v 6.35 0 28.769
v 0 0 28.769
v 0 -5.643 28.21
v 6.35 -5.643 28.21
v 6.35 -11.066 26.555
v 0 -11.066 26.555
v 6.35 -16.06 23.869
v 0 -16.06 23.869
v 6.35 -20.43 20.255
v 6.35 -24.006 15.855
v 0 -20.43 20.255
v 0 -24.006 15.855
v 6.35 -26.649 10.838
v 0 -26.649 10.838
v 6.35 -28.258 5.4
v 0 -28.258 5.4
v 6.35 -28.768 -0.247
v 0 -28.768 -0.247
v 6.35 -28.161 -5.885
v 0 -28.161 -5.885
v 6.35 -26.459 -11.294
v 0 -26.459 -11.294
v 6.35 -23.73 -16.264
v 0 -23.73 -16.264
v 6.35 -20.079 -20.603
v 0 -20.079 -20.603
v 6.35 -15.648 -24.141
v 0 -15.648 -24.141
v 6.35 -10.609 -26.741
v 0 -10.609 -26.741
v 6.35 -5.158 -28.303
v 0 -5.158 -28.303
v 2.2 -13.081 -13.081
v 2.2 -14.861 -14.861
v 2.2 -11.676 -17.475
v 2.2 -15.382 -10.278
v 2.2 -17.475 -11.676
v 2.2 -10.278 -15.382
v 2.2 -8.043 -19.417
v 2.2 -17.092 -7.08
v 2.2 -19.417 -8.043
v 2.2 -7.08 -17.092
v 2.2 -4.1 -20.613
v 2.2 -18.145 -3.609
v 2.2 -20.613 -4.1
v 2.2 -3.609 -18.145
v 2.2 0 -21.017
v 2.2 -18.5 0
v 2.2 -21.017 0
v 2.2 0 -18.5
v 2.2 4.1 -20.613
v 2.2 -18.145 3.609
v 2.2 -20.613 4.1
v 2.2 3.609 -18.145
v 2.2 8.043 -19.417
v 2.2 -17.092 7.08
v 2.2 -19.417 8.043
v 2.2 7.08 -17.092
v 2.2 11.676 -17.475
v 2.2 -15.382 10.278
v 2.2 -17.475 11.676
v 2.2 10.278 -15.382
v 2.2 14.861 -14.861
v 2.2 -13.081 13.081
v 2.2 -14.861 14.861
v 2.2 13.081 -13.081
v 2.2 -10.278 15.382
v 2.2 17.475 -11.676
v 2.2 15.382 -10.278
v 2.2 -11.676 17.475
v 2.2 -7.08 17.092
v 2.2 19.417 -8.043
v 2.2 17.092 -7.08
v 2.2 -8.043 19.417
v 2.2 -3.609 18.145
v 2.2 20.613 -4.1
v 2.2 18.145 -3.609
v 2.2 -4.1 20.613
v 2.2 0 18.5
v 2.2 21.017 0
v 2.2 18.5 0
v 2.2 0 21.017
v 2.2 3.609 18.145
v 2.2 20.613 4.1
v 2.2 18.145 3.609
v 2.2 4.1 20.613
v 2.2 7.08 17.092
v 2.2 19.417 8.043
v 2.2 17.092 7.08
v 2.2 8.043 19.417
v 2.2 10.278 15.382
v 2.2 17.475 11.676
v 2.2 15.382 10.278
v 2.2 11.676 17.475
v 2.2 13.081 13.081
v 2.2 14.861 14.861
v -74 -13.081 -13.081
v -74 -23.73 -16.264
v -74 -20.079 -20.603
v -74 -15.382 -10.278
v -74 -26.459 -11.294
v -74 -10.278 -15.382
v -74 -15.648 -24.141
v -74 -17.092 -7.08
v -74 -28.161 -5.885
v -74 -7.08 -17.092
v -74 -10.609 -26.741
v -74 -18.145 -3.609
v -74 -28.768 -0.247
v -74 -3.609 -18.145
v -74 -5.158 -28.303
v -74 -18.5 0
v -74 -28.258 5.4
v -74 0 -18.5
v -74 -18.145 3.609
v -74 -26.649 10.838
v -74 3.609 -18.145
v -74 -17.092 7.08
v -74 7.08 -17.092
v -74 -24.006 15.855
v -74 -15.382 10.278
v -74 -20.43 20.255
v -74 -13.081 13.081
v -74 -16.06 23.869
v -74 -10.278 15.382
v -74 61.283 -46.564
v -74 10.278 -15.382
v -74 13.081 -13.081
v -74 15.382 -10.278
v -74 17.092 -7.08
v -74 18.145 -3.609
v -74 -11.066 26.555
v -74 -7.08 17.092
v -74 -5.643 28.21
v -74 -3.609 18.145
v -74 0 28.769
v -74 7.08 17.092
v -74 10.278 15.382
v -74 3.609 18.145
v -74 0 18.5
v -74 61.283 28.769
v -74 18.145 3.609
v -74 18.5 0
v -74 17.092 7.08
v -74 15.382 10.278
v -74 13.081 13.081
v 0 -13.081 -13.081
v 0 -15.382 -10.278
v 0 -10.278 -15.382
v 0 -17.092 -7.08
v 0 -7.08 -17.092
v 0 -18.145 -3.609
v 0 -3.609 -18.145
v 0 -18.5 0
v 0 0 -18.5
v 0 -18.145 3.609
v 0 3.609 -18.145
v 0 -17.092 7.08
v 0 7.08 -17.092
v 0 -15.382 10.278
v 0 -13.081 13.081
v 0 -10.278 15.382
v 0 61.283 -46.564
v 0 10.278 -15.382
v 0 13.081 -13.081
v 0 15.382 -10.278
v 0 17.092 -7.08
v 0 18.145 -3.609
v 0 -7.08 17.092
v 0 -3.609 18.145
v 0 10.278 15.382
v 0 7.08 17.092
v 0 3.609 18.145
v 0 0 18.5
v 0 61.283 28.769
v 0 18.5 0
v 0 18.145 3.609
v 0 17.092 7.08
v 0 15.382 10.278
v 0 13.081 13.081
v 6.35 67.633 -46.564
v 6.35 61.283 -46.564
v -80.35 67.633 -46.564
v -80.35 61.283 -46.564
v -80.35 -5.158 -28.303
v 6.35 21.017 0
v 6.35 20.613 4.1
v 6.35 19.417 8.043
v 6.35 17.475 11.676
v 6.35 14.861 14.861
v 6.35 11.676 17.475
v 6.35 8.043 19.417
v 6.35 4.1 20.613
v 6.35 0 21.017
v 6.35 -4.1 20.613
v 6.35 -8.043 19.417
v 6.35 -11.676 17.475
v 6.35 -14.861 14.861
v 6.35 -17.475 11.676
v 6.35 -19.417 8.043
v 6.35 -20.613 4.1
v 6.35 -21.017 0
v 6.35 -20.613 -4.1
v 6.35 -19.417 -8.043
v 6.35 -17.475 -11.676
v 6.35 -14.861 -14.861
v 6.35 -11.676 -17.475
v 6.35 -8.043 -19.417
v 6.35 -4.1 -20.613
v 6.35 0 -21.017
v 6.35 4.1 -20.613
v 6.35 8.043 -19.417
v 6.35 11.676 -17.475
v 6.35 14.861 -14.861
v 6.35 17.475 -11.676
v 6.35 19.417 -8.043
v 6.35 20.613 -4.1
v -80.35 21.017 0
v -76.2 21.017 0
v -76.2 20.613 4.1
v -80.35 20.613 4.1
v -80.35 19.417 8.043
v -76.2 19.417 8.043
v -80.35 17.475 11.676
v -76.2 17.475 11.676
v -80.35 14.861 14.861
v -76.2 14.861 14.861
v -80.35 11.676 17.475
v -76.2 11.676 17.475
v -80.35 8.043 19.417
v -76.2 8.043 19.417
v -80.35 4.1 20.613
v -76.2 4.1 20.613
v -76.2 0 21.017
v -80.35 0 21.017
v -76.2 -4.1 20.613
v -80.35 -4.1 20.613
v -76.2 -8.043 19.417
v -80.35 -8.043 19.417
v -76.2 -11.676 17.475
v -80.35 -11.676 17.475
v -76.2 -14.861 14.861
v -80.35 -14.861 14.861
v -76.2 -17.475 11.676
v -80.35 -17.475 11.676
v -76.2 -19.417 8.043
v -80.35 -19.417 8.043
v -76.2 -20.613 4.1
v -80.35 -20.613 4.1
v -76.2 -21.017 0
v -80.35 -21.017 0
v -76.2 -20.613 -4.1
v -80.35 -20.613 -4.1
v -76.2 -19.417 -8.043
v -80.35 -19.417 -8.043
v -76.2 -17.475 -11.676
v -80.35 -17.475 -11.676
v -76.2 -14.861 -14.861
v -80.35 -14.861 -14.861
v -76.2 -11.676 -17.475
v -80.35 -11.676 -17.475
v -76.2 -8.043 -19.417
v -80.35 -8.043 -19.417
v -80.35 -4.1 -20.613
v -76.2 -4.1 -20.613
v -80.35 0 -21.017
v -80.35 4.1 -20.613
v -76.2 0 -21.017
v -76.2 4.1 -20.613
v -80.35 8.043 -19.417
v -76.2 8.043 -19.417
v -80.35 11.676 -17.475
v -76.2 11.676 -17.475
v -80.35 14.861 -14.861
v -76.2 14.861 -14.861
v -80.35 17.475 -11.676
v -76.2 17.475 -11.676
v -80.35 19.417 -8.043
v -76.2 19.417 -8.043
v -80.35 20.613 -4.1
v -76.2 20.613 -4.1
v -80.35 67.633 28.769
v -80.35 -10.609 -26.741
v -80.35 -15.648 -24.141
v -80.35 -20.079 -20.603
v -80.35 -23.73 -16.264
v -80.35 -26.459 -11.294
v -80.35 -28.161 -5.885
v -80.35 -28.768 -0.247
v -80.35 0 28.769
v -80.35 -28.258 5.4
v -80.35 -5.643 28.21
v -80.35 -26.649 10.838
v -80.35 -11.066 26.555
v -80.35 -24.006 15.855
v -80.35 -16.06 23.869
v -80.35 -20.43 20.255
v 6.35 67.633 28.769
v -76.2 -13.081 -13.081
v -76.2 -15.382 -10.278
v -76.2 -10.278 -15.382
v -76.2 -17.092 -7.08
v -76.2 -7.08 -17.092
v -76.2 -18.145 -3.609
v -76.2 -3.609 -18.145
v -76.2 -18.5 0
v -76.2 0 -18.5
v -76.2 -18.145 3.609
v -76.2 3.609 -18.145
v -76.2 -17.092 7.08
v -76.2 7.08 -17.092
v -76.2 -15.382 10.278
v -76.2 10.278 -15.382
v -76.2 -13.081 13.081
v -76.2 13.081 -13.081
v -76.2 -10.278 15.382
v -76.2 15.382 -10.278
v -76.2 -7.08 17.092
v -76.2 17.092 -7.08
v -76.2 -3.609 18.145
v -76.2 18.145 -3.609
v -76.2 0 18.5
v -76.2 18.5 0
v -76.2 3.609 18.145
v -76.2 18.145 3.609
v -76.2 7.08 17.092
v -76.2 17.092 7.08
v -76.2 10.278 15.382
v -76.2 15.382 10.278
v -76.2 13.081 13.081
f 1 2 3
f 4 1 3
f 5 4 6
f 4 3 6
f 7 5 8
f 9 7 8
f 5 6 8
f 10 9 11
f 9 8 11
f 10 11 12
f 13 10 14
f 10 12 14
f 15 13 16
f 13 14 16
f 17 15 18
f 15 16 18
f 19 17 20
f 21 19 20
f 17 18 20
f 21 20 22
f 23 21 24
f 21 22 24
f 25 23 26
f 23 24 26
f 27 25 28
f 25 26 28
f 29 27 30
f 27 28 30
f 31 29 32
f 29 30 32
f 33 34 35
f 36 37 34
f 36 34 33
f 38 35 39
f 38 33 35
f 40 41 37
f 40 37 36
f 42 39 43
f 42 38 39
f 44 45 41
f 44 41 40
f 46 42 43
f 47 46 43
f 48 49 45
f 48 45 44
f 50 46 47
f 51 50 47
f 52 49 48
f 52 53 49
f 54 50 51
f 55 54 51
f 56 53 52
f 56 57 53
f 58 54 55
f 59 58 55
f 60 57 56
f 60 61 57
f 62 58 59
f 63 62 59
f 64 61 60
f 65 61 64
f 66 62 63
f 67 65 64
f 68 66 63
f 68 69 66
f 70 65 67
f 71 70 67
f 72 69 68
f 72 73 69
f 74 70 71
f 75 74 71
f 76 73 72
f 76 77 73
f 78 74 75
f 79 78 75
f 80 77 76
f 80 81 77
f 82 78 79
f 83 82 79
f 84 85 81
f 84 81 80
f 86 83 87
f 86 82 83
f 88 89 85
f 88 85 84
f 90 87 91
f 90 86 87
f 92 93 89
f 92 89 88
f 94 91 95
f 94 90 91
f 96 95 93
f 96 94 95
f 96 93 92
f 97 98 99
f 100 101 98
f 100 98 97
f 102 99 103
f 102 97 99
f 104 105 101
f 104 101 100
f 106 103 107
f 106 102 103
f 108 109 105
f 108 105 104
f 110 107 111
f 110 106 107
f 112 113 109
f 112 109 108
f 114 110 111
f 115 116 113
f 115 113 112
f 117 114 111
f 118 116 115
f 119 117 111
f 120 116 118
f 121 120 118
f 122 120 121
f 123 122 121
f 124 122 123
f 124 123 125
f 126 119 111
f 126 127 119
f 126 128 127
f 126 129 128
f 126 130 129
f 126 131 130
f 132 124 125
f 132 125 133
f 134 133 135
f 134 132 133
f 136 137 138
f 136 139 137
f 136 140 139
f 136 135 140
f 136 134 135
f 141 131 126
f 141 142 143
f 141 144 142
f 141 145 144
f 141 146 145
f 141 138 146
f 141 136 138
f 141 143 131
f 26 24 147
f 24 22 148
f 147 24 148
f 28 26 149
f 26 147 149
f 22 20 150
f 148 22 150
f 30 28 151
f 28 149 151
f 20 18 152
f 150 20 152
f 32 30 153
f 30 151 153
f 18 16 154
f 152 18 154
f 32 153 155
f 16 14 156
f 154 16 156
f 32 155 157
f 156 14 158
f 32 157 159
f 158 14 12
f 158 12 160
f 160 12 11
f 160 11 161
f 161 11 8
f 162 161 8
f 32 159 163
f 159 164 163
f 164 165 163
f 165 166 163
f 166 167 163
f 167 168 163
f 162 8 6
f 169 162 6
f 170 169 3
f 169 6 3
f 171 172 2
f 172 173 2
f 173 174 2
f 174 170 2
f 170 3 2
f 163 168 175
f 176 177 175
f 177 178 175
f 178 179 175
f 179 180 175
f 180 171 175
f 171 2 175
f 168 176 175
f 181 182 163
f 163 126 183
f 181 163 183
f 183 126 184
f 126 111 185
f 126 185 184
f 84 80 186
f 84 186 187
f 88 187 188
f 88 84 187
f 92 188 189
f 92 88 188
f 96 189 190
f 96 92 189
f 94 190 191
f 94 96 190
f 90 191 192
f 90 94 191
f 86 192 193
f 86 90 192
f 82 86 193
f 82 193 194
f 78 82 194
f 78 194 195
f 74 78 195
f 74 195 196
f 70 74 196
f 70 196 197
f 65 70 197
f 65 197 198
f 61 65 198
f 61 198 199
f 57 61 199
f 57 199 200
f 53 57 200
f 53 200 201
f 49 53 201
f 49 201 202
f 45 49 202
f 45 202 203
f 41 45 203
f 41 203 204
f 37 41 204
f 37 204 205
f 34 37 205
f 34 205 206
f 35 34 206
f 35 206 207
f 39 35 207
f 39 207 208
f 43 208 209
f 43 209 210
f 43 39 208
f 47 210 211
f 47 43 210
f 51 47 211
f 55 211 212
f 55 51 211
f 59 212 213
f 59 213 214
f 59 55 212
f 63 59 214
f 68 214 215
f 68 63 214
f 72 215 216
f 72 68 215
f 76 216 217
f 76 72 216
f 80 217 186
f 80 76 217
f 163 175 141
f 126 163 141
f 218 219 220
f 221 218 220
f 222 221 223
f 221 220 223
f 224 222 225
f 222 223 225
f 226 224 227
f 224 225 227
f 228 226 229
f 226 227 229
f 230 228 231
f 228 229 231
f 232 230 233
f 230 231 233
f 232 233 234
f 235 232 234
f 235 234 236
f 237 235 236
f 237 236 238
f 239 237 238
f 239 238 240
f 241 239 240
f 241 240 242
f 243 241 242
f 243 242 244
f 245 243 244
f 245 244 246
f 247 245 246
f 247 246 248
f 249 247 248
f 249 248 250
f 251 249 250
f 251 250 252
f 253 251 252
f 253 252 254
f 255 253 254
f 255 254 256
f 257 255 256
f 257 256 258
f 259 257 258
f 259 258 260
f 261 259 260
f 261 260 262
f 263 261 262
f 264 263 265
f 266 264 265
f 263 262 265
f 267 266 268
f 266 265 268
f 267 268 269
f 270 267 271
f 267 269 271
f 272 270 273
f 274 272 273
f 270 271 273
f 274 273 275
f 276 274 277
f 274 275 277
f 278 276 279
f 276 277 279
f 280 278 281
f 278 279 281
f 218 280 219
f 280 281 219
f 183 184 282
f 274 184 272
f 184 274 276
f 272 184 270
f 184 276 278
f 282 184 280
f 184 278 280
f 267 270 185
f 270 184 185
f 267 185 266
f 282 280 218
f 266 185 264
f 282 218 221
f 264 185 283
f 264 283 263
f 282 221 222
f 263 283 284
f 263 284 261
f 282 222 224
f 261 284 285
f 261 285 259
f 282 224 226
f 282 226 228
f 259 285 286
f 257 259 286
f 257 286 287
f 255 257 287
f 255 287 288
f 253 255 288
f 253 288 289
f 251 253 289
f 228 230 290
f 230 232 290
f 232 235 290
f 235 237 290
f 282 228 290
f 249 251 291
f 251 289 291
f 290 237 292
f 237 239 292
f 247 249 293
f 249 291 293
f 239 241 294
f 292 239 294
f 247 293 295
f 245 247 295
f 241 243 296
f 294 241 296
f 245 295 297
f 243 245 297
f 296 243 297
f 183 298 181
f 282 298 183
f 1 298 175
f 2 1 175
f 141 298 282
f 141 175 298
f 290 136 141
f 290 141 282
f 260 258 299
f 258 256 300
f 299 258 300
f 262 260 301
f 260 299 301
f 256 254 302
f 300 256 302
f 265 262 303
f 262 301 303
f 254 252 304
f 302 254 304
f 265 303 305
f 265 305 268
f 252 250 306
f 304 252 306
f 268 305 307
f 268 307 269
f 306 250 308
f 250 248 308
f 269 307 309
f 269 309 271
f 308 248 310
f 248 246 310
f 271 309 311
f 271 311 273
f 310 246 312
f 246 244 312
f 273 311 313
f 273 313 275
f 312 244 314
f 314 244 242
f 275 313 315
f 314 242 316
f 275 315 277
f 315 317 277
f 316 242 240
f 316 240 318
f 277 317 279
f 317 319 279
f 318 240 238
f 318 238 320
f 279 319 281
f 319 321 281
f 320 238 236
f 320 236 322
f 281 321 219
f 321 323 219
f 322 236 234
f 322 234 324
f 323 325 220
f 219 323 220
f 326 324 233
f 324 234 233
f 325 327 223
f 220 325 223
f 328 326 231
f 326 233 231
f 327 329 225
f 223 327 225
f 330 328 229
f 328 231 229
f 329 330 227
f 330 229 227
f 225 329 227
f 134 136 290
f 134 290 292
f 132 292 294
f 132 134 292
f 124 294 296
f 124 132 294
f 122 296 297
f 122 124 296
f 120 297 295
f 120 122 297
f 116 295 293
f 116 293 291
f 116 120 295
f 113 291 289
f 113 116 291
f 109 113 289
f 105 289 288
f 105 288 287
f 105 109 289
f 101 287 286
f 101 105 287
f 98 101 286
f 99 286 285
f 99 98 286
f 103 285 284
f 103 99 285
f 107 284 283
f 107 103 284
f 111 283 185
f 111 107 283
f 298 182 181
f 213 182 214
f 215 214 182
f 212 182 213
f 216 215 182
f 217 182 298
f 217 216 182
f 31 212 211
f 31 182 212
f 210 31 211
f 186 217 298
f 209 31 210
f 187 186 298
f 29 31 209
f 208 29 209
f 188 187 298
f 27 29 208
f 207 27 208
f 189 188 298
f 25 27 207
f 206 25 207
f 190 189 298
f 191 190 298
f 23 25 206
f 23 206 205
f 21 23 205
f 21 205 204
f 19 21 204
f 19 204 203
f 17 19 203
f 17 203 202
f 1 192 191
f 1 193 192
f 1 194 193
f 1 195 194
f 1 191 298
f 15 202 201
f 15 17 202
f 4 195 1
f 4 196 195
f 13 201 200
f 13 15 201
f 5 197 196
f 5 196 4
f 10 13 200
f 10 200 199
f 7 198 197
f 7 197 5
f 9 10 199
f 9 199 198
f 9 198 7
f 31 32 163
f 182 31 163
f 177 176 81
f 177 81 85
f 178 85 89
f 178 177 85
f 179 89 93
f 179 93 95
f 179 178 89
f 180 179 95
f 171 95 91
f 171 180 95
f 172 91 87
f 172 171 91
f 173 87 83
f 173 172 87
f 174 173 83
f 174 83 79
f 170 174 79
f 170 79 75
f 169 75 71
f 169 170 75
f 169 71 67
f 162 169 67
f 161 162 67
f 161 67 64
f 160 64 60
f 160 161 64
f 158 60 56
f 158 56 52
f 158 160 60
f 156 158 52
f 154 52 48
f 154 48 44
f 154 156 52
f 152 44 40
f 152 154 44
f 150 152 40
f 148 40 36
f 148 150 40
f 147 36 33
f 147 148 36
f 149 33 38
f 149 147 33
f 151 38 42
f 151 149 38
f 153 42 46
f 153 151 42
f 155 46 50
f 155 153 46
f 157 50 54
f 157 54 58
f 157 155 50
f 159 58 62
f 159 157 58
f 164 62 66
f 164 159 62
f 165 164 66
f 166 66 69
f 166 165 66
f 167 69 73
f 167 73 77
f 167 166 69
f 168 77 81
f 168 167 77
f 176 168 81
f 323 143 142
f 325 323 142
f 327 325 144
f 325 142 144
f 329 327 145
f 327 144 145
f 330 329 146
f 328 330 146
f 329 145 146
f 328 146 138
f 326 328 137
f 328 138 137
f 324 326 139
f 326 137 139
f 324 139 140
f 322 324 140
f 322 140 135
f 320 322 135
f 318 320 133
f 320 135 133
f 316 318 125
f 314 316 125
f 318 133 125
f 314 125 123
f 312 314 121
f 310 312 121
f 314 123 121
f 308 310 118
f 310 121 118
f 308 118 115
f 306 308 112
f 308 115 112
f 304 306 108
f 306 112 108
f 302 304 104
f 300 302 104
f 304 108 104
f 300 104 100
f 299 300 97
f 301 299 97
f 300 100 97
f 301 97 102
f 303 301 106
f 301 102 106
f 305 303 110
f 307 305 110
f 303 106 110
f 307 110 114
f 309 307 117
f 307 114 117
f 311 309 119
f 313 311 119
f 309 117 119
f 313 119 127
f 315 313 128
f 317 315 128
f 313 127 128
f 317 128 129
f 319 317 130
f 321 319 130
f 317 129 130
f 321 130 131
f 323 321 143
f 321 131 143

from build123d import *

# Parameters (mm, degrees)
F0_R     = 23
F0_R_2   = 18.5
F1_DEPTH = 2.2
F2_R     = 28.7689848305
F2_R_2   = 21.0167623051
F3_DEPTH = 6.35
F5_DEPTH = 6.35
F8_W     = 86.7
F8_H     = 75.3333002466
F9_DEPTH = 6.35


with BuildPart() as f1:
    # F0 (on Right) → F1 (new body)
    with BuildSketch(Plane.YZ):
        Circle(F0_R)
        Circle(F0_R_2, mode=Mode.SUBTRACT)
    extrude(amount=F1_DEPTH)

    # F2 (on Right) → F3 (join)
    with BuildSketch(Plane.YZ):
        Circle(F2_R)
        Circle(F2_R_2, mode=Mode.SUBTRACT)
    extrude(amount=F3_DEPTH)

    # F4 (on Right) → F5 (join)
    with BuildSketch(Plane.YZ):
        with BuildLine():
            Line((61.2828924653, 28.7689848305), (0, 28.7689848305))
            ThreePointArc((0, 28.7689848305), (28.652224252, -2.5893114127), (-5.1576050869, -28.3028902754))
            Line((-5.1576050869, -28.3028902754), (61.2828924653, -46.5643154161))
            Line((61.2828924653, -46.5643154161), (61.2828924653, 28.7689848305))
        make_face()
    extrude(amount=F5_DEPTH)


with BuildPart() as f6_1:
    # F6: instance of F1
    add(f1.part.mirror(Plane.YZ))


with BuildPart() as f6_1_1:
    # F7: moved
    add(f6_1.part.moved(Location((-74, 0, 0))))


with BuildPart() as f1_1:
    add(f1.part)

    add(f6_1_1.part)  # F9 merges F6_1
    # F8 (on face) → F9 (join)
    with BuildSketch(Plane(origin=(0, 61.2828924653, 0), x_dir=(-1, 0, 0), z_dir=(0, 1, 0))):
        with Locations((37, -8.8976652928)):
            Rectangle(F8_W, F8_H)
    extrude(amount=F9_DEPTH)


solid = f1_1.part
